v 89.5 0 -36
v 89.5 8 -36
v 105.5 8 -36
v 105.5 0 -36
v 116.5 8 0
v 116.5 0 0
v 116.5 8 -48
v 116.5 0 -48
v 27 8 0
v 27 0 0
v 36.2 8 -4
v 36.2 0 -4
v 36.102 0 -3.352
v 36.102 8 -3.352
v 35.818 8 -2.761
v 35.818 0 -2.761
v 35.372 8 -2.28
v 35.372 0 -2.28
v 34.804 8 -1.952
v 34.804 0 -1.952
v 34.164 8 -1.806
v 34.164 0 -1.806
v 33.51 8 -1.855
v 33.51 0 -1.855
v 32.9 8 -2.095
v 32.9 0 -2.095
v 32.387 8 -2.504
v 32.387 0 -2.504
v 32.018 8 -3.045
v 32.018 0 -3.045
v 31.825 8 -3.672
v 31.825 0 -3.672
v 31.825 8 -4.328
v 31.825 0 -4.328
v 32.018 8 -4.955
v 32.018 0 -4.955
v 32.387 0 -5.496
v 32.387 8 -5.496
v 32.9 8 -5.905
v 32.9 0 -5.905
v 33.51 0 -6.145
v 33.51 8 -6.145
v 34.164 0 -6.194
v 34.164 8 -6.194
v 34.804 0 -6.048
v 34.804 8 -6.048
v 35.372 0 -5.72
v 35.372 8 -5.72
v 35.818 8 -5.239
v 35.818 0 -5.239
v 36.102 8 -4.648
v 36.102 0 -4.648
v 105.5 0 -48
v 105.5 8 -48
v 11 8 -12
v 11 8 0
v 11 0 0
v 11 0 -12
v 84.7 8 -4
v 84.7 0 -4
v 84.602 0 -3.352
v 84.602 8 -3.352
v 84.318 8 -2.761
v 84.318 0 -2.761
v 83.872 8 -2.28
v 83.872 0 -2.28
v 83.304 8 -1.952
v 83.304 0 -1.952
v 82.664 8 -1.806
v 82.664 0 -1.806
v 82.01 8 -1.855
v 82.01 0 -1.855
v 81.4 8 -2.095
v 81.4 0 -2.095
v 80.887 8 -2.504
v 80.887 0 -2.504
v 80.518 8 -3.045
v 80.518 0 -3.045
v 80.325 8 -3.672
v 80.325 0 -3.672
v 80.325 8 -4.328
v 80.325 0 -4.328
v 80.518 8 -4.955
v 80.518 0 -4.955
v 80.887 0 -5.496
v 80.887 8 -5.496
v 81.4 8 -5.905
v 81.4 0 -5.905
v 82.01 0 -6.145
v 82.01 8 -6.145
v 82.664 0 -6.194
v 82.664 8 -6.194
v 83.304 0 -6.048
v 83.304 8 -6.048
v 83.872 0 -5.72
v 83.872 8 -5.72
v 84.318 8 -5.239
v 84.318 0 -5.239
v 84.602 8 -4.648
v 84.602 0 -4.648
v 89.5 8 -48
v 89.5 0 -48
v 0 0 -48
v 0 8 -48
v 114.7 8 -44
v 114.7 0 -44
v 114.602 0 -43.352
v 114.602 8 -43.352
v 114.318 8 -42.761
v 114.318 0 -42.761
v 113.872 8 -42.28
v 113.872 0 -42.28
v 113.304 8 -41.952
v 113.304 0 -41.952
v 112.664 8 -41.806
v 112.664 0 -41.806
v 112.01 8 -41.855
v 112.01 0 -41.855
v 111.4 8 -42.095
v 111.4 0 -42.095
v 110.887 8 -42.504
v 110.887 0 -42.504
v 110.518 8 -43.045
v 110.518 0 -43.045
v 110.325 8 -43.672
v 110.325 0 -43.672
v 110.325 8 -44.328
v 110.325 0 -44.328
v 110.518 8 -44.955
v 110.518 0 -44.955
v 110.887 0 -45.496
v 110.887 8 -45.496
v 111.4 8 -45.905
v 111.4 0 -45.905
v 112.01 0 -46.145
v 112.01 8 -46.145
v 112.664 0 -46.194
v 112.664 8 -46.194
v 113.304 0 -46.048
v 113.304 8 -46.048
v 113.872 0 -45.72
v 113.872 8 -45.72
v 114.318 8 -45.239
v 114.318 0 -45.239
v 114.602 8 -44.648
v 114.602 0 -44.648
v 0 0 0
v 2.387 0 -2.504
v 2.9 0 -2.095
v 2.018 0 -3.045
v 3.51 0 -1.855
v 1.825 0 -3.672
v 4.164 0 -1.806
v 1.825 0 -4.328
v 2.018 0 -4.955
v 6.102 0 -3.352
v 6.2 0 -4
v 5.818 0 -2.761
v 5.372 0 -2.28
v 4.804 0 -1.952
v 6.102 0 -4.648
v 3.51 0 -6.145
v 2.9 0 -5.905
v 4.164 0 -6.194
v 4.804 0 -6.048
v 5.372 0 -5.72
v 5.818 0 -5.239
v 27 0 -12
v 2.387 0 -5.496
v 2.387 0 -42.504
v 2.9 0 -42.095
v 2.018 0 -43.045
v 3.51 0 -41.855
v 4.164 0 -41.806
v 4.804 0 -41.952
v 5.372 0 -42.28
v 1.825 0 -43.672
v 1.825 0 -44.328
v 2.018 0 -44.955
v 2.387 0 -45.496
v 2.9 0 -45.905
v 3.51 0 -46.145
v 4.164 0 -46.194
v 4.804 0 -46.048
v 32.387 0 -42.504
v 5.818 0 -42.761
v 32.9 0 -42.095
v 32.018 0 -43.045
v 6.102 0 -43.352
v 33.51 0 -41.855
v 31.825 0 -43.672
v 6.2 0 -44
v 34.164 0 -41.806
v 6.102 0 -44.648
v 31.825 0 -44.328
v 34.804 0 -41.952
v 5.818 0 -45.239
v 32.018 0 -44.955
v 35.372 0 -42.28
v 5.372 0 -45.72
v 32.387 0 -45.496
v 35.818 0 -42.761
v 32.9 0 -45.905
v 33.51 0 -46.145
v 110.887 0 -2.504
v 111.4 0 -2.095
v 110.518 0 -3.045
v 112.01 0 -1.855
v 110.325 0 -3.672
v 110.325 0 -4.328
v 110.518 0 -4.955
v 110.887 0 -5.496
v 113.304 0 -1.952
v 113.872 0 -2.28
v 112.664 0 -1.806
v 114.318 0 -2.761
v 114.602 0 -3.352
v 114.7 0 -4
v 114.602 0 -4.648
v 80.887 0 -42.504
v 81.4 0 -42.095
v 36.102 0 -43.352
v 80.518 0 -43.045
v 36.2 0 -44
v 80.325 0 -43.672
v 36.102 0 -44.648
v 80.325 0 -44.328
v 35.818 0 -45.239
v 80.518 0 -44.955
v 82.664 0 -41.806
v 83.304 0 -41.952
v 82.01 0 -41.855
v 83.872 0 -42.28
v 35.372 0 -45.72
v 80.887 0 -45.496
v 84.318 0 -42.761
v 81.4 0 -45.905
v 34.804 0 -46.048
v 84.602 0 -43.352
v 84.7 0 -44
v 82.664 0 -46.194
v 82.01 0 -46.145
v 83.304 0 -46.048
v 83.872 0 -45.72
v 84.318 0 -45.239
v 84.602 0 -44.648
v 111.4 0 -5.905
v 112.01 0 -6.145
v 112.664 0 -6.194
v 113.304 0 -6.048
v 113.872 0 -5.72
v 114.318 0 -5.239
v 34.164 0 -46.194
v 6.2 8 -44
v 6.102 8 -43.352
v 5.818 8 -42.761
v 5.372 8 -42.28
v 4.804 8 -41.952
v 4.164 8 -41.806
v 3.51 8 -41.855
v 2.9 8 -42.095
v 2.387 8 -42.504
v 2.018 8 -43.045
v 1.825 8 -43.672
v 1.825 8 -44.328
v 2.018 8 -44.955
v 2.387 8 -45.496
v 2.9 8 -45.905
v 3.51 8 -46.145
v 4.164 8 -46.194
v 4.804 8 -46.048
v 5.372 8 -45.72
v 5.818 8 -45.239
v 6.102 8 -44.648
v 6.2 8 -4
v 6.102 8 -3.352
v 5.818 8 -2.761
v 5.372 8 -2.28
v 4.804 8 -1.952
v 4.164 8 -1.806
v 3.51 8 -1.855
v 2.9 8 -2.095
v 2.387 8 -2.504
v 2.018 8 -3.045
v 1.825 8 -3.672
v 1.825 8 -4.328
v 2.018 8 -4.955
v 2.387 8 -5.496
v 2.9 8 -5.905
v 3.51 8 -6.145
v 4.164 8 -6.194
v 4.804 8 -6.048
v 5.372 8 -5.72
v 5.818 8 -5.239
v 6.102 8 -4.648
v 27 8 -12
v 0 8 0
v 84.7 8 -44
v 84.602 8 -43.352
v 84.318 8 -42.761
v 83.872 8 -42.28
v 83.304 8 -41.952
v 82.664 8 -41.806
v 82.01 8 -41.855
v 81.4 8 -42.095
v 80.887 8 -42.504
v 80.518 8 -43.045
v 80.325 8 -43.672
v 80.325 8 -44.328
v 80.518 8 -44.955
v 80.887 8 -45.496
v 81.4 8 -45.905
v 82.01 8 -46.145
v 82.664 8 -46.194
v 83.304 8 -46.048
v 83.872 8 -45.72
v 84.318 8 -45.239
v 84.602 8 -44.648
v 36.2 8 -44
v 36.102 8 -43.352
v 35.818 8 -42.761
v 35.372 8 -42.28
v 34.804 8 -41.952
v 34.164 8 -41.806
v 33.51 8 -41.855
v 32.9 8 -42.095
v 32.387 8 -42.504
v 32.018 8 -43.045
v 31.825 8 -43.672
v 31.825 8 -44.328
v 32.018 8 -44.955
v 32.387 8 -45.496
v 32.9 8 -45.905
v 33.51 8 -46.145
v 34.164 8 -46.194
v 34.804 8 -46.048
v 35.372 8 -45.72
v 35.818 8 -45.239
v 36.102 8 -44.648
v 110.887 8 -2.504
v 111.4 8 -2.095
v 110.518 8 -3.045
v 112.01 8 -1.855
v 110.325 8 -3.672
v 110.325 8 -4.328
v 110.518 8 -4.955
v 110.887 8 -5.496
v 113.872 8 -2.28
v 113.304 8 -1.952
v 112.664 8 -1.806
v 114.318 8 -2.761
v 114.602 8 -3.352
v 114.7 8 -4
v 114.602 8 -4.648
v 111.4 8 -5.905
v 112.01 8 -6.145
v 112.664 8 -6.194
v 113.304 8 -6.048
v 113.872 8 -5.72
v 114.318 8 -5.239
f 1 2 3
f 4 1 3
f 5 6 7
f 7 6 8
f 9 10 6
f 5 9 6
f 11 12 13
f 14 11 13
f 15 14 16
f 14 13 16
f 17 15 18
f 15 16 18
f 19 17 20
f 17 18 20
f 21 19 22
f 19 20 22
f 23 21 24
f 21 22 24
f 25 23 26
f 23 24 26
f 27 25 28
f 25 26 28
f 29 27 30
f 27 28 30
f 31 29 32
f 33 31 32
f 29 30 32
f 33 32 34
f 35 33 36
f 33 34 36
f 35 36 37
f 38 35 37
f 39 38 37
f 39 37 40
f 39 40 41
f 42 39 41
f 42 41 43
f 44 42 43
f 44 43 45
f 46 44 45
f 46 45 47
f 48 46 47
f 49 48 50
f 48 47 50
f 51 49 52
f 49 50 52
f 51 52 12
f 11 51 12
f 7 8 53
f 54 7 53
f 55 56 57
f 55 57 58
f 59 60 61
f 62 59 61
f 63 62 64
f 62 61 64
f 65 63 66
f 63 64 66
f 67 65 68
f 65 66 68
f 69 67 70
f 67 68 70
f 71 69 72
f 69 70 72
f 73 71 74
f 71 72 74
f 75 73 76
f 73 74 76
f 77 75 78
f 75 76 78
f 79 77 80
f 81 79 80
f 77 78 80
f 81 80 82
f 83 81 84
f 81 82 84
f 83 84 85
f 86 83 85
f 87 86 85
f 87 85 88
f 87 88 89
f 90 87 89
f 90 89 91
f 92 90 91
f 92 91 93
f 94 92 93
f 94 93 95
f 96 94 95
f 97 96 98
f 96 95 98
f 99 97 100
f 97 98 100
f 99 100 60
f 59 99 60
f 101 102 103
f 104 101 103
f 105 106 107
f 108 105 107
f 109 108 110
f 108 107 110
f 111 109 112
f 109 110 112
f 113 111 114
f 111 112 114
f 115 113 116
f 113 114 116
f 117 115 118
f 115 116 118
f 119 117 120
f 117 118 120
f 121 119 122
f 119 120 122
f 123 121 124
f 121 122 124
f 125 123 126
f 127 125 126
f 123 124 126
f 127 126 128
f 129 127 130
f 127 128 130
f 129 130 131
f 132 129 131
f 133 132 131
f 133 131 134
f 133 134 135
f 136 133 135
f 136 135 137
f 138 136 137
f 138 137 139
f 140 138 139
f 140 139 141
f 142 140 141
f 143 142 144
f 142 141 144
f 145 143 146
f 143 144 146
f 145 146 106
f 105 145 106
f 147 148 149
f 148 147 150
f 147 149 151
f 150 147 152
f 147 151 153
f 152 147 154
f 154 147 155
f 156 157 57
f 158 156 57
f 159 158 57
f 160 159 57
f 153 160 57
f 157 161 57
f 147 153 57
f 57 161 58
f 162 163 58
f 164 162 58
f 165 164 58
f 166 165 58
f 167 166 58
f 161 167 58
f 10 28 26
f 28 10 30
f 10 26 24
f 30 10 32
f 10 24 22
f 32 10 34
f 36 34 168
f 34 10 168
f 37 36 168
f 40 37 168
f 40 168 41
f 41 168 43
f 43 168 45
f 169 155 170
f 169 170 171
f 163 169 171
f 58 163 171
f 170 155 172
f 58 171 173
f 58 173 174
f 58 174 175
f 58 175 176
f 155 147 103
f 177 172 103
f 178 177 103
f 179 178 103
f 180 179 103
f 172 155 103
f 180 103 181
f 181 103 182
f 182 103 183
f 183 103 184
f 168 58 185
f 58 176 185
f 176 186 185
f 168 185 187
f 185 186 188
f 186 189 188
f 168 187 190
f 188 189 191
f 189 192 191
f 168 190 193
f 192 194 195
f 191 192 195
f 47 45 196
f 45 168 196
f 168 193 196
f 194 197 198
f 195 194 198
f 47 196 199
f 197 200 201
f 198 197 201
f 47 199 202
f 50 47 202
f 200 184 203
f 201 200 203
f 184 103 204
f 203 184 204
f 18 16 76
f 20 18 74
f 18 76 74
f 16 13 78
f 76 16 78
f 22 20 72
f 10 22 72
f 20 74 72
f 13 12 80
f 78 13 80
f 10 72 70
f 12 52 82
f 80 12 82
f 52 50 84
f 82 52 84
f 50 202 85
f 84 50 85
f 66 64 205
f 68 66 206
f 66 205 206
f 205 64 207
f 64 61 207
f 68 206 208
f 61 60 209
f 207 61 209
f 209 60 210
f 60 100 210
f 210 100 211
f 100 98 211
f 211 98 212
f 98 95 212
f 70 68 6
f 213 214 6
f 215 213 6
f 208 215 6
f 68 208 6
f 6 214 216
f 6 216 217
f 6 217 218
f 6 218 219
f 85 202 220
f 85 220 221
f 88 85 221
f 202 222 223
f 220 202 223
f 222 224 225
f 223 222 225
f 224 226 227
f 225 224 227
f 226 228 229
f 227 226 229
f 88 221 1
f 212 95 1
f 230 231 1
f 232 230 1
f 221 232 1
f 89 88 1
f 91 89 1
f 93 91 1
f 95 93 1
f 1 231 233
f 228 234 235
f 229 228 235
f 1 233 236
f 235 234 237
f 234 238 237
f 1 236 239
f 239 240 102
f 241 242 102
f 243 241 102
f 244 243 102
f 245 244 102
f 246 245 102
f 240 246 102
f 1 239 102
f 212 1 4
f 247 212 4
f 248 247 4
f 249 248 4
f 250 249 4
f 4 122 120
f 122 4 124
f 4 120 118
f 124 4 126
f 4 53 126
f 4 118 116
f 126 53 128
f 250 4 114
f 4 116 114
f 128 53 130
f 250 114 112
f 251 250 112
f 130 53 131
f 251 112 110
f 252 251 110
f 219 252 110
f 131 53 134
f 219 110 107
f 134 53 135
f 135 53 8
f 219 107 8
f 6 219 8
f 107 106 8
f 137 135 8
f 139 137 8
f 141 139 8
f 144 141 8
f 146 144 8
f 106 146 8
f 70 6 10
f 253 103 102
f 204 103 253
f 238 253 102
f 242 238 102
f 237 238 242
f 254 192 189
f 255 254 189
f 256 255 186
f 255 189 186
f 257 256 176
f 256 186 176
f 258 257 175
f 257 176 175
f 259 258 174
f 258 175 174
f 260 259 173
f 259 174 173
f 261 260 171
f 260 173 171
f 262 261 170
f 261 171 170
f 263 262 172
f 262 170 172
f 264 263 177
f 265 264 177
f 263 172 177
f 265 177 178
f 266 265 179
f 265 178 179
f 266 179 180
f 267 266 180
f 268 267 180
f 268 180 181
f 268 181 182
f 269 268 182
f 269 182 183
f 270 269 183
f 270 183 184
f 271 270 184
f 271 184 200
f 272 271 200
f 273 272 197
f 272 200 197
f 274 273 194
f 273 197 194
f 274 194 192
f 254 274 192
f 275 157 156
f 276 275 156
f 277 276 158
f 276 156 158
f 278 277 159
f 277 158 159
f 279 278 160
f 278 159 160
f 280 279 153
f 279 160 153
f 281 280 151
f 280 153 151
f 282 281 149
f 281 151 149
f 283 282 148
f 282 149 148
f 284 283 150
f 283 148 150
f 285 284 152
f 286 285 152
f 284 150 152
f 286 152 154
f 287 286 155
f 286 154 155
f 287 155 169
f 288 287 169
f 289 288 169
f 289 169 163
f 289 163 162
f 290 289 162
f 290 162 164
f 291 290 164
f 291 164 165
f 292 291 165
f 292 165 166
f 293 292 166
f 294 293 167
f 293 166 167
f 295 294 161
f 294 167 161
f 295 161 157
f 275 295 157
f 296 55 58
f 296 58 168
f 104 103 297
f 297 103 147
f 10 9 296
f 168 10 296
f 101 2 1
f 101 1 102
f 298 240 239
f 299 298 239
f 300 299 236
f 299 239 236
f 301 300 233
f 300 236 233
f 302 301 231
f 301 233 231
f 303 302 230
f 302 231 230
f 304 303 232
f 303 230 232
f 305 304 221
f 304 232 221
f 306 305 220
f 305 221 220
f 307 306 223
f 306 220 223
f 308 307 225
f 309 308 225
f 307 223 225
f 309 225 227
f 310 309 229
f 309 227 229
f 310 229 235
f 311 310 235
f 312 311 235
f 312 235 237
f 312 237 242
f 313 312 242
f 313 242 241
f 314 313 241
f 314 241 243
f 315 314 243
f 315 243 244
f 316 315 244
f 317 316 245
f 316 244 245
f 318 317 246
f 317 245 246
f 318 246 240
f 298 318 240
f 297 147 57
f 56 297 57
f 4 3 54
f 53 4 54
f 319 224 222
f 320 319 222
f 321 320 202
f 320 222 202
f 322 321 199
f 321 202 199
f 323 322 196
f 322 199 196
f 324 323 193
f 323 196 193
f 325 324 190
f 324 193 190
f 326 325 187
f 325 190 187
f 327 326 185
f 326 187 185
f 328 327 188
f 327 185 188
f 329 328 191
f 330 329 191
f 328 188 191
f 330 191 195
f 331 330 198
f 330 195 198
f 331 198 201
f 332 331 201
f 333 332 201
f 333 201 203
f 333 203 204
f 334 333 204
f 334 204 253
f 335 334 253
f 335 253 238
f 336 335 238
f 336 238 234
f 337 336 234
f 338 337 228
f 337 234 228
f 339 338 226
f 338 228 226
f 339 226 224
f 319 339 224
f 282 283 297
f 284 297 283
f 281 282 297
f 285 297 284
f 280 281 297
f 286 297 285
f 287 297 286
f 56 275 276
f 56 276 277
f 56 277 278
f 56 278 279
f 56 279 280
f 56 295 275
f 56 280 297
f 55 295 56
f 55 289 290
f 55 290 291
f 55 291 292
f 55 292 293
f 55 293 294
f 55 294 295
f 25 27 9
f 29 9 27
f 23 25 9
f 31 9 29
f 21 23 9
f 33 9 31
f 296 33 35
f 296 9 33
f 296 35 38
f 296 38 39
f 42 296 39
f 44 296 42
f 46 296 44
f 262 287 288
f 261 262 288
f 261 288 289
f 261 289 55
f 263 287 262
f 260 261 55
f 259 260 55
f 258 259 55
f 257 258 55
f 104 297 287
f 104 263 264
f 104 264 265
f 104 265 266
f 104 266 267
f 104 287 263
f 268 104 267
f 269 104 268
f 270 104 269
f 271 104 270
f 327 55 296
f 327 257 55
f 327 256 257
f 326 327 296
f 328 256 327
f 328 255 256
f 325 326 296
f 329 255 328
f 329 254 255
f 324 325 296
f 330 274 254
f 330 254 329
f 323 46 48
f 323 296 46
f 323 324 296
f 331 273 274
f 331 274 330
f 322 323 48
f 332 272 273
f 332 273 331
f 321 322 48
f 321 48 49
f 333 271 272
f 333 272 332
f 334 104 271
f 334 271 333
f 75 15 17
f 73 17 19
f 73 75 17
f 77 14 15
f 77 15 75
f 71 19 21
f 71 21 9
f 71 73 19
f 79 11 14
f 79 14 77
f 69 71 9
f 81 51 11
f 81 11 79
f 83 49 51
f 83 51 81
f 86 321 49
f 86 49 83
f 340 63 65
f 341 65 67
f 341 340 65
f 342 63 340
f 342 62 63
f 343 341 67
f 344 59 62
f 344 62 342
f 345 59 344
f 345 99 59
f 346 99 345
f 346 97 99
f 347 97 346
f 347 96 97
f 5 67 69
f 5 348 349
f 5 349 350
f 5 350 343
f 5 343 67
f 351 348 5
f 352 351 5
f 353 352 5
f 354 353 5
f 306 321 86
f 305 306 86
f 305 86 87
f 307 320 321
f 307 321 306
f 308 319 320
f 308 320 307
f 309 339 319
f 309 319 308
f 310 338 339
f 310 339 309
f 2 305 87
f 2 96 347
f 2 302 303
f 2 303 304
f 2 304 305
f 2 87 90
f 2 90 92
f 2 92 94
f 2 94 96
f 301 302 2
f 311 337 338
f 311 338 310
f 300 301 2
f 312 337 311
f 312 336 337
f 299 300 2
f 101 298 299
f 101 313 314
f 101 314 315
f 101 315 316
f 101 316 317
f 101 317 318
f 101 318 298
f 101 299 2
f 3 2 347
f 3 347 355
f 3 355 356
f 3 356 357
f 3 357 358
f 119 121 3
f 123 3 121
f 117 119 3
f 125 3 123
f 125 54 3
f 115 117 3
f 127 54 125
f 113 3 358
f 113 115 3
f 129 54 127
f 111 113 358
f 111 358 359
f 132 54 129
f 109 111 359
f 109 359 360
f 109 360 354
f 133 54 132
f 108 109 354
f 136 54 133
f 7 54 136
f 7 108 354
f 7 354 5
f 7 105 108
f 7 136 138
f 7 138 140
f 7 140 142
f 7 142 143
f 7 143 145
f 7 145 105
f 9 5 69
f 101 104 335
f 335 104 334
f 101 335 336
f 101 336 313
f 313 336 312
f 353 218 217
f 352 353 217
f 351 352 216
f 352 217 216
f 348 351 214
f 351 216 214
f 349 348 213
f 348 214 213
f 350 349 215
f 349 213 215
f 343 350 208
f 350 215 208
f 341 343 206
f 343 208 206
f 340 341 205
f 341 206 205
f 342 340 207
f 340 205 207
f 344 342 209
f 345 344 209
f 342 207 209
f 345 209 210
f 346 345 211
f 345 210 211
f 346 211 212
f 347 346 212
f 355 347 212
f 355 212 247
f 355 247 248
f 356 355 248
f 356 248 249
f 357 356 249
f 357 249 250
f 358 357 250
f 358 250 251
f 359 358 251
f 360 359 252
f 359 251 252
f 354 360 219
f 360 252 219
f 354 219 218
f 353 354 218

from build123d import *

# Parameters (mm, degrees)
BOSS_EXTRU_1_DEPTH      = 8
ESQUISSE3_R             = 2.2
ENL_V_MAT_EXTRU_1_DEPTH = 8
ESQUISSE5_W             = 16
ESQUISSE5_H             = 12
ENL_V_MAT_EXTRU_2_DEPTH = 8


with BuildPart() as part:
    # Esquisse1 → Boss.-Extru.1 (new body)
    with BuildSketch(Plane(origin=(0, 0, 0), x_dir=(1, 0, 0), z_dir=(0, 1, 0))):
        Polygon((0, 0), (38, 0), (78.5, 0), (116.5, 0), (116.5, 48), (78.5, 48), (38, 48), (0, 48), align=None)
    extrude(amount=BOSS_EXTRU_1_DEPTH)

    # Esquisse3 → Enlèv. mat.-Extru.1 (cut)
    with BuildSketch(Plane.XZ):
        with Locations((4, -4)):
            Circle(ESQUISSE3_R)
        with Locations((34, -4)):
            Circle(ESQUISSE3_R)
        with Locations((34, -44)):
            Circle(ESQUISSE3_R)
        with Locations((4, -44)):
            Circle(ESQUISSE3_R)
        with Locations((112.5, -44)):
            Circle(ESQUISSE3_R)
        with Locations((82.5, -44)):
            Circle(ESQUISSE3_R)
        with Locations((82.5, -4)):
            Circle(ESQUISSE3_R)
        with Locations((112.5, -4)):
            Circle(ESQUISSE3_R)
    extrude(amount=-ENL_V_MAT_EXTRU_1_DEPTH, mode=Mode.SUBTRACT)

    # Esquisse5 → Enlèv. mat.-Extru.2 (cut)
    with BuildSketch(Plane(origin=(0, 8, 0), x_dir=(1, 0, 0), z_dir=(0, 1, 0))):
        with Locations((97.5, 42)):
            Rectangle(ESQUISSE5_W, ESQUISSE5_H)
        with Locations((19, 6)):
            Rectangle(ESQUISSE5_W, ESQUISSE5_H)
    extrude(amount=-ENL_V_MAT_EXTRU_2_DEPTH, mode=Mode.SUBTRACT)


solid = part.part
